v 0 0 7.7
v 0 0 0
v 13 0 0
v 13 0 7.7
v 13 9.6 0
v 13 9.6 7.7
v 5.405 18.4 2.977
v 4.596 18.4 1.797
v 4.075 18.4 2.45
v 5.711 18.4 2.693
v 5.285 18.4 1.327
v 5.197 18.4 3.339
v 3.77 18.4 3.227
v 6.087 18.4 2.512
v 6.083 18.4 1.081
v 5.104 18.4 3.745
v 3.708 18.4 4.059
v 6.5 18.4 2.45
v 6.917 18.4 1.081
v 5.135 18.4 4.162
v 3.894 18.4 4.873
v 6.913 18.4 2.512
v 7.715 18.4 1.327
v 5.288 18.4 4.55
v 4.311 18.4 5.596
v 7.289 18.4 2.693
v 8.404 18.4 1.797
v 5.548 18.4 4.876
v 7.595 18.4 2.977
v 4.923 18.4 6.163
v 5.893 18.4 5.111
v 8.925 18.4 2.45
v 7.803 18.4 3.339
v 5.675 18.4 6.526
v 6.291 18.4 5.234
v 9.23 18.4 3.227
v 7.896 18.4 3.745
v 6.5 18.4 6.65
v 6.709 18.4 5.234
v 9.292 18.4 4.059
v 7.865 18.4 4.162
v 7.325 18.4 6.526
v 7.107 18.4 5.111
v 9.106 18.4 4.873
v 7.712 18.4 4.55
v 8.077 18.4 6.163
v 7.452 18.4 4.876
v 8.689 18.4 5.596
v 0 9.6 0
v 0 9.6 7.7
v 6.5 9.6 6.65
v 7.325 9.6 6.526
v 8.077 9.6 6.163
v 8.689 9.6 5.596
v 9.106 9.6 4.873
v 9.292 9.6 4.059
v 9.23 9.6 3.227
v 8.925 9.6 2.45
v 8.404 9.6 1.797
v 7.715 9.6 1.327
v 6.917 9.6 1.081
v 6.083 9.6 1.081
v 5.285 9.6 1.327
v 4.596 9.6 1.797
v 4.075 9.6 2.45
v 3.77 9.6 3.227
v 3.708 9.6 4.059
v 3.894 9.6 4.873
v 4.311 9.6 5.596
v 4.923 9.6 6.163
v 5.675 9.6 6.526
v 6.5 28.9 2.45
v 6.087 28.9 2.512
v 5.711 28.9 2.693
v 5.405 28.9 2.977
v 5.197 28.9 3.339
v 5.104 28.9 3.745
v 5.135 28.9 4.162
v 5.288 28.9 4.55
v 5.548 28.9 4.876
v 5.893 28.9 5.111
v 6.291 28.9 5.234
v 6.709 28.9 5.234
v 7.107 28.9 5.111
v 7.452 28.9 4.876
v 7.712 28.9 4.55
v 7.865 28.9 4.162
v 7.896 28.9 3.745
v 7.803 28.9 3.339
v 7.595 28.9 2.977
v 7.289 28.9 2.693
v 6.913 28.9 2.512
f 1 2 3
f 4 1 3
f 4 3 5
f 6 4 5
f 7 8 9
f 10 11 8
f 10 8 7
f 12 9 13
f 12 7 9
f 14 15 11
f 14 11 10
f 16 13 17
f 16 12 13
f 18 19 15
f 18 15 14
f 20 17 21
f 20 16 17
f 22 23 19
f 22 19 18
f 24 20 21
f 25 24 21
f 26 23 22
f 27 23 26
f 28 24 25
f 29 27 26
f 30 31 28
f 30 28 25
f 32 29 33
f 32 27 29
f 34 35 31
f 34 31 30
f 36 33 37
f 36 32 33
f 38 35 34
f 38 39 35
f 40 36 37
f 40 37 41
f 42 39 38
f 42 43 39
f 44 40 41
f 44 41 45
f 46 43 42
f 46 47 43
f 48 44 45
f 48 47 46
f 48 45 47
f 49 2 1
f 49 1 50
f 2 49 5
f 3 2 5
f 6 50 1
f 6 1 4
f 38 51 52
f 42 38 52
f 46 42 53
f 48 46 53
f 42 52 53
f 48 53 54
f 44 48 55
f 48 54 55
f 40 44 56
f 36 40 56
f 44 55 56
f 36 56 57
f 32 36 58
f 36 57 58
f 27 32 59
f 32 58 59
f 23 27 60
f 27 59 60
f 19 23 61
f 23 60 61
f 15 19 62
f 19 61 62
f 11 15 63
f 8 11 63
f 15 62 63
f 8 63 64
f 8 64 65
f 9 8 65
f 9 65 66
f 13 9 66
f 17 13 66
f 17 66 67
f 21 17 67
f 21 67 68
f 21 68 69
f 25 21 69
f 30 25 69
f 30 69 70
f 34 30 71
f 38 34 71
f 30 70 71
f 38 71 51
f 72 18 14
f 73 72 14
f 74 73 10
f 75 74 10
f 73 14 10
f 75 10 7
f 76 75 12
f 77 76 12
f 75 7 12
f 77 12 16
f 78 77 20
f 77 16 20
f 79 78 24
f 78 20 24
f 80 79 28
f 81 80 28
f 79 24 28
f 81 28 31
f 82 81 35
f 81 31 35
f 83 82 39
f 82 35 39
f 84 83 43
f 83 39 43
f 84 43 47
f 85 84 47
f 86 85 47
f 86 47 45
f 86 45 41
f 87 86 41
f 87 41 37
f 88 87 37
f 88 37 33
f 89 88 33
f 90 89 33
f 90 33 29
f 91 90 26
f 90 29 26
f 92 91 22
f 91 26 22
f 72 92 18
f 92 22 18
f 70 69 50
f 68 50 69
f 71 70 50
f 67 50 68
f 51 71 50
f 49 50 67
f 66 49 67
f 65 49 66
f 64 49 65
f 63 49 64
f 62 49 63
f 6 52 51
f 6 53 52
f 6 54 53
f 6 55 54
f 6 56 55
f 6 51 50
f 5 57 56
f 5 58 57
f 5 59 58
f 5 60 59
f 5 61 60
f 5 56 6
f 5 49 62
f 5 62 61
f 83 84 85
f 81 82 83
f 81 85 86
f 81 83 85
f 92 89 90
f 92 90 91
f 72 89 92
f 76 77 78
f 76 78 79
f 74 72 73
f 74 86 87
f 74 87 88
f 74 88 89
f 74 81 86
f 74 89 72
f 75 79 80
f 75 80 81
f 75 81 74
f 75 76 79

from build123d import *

# Parameters (mm, degrees)
ESBO_O2_W                = 13
ESBO_O2_H                = 9.6
RESSALTO_EXTRUS_O1_DEPTH = 7.7
ESBO_O3_R                = 2.8
RESSALTO_EXTRUS_O2_DEPTH = 8.8
ESBO_O5_R                = 1.4
RESSALTO_EXTRUS_O3_DEPTH = 10.5


with BuildPart() as part:
    # Esboço2 → Ressalto-extrusão1 (new body)
    with BuildSketch(Plane.XY):
        with Locations((6.5, 4.8)):
            Rectangle(ESBO_O2_W, ESBO_O2_H)
    extrude(amount=RESSALTO_EXTRUS_O1_DEPTH)

    # Esboço3 → Ressalto-extrusão2 (add)
    with BuildSketch(Plane(origin=(0, 9.6, 0), x_dir=(1, 0, 0), z_dir=(0, 1, 0))):
        with Locations(Location((6.5, -3.85, 0), (0, 0, 270))):
            Circle(ESBO_O3_R)
    extrude(amount=RESSALTO_EXTRUS_O2_DEPTH)

    # Esboço5 → Ressalto-extrusão3 (add)
    with BuildSketch(Plane(origin=(0, 18.4, 0), x_dir=(1, 0, 0), z_dir=(0, 1, 0))):
        with Locations(Location((6.5, -3.85, 0), (0, 0, 90))):
            Circle(ESBO_O5_R)
    extrude(amount=RESSALTO_EXTRUS_O3_DEPTH)


solid = part.part
